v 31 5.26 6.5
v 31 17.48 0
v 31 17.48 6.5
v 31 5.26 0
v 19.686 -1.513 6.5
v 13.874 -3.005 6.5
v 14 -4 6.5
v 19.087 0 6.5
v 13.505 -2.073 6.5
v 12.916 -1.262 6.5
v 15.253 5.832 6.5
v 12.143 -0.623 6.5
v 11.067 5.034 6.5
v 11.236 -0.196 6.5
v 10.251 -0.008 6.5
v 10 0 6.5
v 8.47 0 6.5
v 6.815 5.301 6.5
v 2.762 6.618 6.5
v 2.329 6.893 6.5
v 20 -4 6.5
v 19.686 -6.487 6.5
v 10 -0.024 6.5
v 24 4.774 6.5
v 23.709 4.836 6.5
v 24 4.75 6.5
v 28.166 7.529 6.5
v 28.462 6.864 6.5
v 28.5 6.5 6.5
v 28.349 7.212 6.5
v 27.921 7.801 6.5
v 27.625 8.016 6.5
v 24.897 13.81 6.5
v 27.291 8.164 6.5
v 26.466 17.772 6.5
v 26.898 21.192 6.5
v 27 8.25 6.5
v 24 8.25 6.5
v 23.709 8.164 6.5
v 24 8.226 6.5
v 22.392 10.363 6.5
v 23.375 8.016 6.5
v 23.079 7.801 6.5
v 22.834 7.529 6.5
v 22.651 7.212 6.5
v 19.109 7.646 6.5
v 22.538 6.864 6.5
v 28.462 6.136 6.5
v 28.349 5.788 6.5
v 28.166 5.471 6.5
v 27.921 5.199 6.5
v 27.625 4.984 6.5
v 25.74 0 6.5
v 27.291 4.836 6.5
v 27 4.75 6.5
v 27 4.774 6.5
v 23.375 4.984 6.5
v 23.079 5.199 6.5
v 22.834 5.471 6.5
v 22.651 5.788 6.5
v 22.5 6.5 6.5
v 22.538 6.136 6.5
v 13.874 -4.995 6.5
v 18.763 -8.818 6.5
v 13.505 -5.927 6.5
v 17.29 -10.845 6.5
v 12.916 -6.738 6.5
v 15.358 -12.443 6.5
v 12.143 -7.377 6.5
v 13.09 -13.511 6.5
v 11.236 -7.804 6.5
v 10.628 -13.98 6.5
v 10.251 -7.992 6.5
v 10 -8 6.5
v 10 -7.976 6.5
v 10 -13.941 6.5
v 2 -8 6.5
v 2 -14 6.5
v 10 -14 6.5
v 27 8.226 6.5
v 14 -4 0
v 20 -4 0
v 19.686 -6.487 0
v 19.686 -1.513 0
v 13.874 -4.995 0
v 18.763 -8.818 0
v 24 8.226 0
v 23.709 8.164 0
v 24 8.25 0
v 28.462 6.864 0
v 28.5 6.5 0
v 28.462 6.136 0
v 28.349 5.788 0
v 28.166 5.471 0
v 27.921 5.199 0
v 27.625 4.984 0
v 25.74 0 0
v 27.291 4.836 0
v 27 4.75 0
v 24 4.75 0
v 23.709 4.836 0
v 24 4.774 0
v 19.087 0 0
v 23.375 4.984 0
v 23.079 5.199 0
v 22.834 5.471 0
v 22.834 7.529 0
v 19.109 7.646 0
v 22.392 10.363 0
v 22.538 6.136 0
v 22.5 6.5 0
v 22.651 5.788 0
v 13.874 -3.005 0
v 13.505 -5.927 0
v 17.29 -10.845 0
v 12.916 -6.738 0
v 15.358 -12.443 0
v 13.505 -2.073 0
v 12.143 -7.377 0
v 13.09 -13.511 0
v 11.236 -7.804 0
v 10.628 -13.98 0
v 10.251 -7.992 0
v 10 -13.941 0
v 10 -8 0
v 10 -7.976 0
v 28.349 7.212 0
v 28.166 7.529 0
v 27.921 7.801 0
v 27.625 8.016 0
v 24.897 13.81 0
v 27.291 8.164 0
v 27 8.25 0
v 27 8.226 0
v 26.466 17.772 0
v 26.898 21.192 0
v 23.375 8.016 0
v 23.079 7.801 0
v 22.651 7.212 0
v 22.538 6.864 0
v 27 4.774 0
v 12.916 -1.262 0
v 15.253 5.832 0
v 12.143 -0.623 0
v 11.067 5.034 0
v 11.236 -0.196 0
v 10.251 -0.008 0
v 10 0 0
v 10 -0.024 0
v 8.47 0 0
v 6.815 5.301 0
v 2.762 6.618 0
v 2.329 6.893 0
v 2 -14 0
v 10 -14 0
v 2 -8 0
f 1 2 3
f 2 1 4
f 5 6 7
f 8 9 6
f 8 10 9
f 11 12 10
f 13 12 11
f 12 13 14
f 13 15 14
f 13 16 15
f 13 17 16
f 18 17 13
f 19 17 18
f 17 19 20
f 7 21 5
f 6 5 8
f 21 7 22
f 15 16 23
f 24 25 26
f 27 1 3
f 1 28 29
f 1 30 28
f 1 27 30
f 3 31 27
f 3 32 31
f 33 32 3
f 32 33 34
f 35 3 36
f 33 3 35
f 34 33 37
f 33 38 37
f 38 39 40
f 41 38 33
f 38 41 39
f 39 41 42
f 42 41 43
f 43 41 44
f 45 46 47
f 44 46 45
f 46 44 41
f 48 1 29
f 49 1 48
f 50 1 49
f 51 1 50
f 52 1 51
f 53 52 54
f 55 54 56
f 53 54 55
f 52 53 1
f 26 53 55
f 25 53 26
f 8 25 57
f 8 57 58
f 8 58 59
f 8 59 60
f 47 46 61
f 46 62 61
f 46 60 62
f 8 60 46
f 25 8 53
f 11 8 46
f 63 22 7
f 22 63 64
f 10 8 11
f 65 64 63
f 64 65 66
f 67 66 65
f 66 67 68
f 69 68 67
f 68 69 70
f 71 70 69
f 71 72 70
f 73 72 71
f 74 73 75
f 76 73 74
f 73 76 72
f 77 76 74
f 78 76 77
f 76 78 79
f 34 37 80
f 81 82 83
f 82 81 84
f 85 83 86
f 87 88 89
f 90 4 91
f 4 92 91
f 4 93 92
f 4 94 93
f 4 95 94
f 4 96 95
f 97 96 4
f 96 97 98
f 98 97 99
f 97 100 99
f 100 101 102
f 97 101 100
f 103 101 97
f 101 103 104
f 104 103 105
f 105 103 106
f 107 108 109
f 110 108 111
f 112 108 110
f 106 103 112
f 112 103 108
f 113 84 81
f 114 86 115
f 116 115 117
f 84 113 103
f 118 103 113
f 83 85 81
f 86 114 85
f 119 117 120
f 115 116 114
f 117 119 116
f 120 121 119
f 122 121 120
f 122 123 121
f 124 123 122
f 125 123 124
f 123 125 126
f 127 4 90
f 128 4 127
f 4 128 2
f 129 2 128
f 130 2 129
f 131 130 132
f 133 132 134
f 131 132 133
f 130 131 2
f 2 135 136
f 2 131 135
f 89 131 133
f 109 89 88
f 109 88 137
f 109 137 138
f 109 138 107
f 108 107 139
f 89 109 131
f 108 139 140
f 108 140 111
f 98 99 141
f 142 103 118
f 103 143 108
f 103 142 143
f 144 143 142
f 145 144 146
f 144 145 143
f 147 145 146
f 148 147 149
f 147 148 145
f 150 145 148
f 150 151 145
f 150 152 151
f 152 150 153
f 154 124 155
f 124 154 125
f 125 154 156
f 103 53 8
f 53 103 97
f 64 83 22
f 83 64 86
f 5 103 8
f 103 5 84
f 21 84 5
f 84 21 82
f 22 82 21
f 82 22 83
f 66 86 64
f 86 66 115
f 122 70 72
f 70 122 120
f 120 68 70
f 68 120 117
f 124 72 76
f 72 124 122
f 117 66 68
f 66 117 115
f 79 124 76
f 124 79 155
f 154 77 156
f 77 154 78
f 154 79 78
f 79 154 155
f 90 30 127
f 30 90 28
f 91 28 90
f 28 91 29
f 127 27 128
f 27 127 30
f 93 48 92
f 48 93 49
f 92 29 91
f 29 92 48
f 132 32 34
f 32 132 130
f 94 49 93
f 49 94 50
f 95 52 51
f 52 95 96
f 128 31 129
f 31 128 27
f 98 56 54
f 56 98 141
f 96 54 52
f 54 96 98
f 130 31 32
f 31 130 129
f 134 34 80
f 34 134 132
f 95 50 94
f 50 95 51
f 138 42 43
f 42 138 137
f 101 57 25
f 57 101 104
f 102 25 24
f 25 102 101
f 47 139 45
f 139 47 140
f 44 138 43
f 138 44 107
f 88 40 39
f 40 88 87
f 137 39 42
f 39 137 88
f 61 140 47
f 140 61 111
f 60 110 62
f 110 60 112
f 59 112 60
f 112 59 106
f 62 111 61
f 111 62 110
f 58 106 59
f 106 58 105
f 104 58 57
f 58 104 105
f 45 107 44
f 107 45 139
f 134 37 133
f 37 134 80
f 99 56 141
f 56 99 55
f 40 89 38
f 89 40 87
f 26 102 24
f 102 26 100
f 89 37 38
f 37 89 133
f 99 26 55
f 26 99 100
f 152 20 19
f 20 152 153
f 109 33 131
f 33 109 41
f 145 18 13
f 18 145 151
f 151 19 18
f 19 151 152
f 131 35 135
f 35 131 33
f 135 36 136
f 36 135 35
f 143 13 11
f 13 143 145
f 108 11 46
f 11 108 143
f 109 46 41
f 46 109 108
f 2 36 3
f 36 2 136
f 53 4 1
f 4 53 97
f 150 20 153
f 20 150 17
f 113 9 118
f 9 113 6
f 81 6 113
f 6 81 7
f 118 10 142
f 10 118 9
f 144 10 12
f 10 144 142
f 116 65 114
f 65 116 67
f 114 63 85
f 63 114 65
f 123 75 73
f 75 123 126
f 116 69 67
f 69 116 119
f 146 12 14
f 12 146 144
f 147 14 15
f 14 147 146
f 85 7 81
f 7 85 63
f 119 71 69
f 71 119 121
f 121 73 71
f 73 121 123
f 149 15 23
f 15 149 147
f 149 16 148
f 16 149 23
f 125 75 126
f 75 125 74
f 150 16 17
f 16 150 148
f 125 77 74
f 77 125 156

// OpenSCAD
// file: library/library_3d.scad
// ========================================================================================
// Robori Mendel
// General 3D library
// GNU GPL v3
//
// Contact : support@robori.com
// Reference : http://www.robori.com/documentation/Mendel
//
// History :
// 2013 - First version
// ========================================================================================

lib3d_fn = 50;

// TESTING
//lib3d_hex_nut_recess(3);
//lib3d_round_cube(10, 8, 10, 1, true, false, true, false);


// Hexagonal nut recess
module lib3d_hex_nut_recess(size)
{
	length = 0.8*size;
	hex_r = 1.8*size/2;
	cylinder(h=length, r=hex_r, center=false, $fn=6);
}

// Cube with customized rounded corners
module lib3d_round_cube(x, y, z, rad, left_top=true, left_bottom=true, right_top=true, right_bottom=true)
{
	rx = x/2 - rad + 0.02;
	ry = y/2 - rad + 0.02;

	translate([x/2, y/2, 0]) difference()
	{	
		translate([-x/2, -y/2, 0]) cube([x, y, z]);
		if (left_top)
			translate([-rx, ry, -1]) rotate([0, 0, 90]) __lib3d_round_corner(rad, z + 2);
		if (left_bottom)
			translate([-rx, -ry, -1]) rotate([0, 0, 180]) __lib3d_round_corner(rad, z + 2);
		if (right_top)
			translate([rx, ry, -1]) __lib3d_round_corner(rad, z + 2);
		if (right_bottom)
			translate([rx, -ry, -1]) rotate([0, 0, 270]) __lib3d_round_corner(rad, z + 2);
	}
}

// Helper
module __lib3d_round_corner(rad, height)
{
	difference()
	{
		cube([rad, rad, height]);
		cylinder(h=height, r=rad, center=false, $fn=lib3d_fn);
	}
}
// file: extruder-block.scad
// ========================================================================================
// Robori Mendel
// Extruder block
// GNU GPL v3
//
// Contact : support@robori.com
// Reference : http://www.robori.com/documentation/Mendel
//
// History :
// 1 May 2015 - Increase plate thickness
// ========================================================================================

include <library/library_3d.scad>;

$fn = 30;
lib3d_fn = 30;

// Add plate thickness
add_t = 0.5;
union()
{
	extruder_block();
	translate([0, 0, -add_t + 0.01]) linear_extrude(height=add_t, convexity=10) import(file="extruder-block-projection.dxf", layer="0");
}

// Create 2D projection to be exported into DXF
//projection(cut=true) translate([0, 0, -0.1]) extruder_block();


module extruder_block()
{
	rotate([180, 0, 180]) union()
	{
		base();
		translate([22.5, 51, 0]) clamp();
		translate([44.74 + 1.5, 28, 0]) idler_mount();
		translate([44.74 + 1.5, -3, 0]) idler_adjuster();
	}
}

module idler_adjuster()
{
	nut_size = 3 + 0.8;
	nut_h = 0.8*nut_size;
	recess_h = 7;
	count = floor(recess_h/nut_h);

	difference()
	{
		// block
		translate([0, 0, -24.25]) lib3d_round_cube(21.12, 14 + 3, 24.25, 3, false, false, false, true);
		// bearing housing
		translate([9.87, 21 + 3, -24.25 - 1]) cylinder(h=24.25 + 2, r=9 + 0.3, center=false);
		// angle cut
		translate([17.4, 14 + 3, -24.25 - 1]) rotate([0, 0, -25]) cube([5, 5, 24.25 + 2]);
		// screw hole
		translate([9.87, 2.75 + 3, -24.25 - 1 - 0.5]) cylinder(h=20.5 + 1 + add_t, r=1.5 + 0.4, center=false);
		translate([9.87, 2.75 + 3, -3.75 + add_t]) cylinder(h=3.75 + 1 - add_t, r=2.25 + 0.75, center=false);
		// idler screw holes
		translate([-1, 8.5 + 3, -4.75]) rotate([0, 90, 0]) cylinder(h=21.12 + 2, r=2, center=false);
		translate([-1, 8.5 + 3, -19.75]) rotate([0, 90, 0]) cylinder(h=21.12 + 2, r=2, center=false);
		// idler nut recesses
		for (i = [0 : 1 : count - 1])
		{
			translate([i*nut_h - (i + 1)*0.02, 8.5 + 3, -4.75]) rotate([90, 0, 90]) lib3d_hex_nut_recess(nut_size);
			translate([i*nut_h - (i + 1)*0.02, 8.5 + 3, -19.75]) rotate([90, 0, 90]) lib3d_hex_nut_recess(nut_size);
		}
		translate([recess_h - nut_h, 8.5 + 3, -4.75]) rotate([90, 0, 90]) lib3d_hex_nut_recess(nut_size);
		translate([recess_h - nut_h, 8.5 + 3, -19.75]) rotate([90, 0, 90]) lib3d_hex_nut_recess(nut_size);
		// filament hole
		translate([16.25, -1, -12.25]) rotate([-90, 0, 0]) cylinder(h=14 + 3 + 2, r=1.25, center=false);
		// cut length
		translate([-1, -1, -24.25 -1]) cube([3.5 + 1, 14 + 3 + 2, 24.25 + 2]);
	}
}

module idler_mount()
{
	difference()
	{
		union()
		{
			// block
			translate([0, 0, -24.25]) cube([21.12, 14 + 3, 24.25]);
			// mount
			translate([17.4, 0, -24.25]) lib3d_round_cube(21.58, 17, 24.25, 5, false, false, true, false);
		}
		// bearing housing
		translate([9.87, -7, -24.25 - 1]) cylinder(h=24.25 + 2, r=9 + 0.3, center=false);
		// mount
		// 2015-05-13 : adjust idler position 0.5mm to center MK7 drive gear
		translate([21.12, 0, -7.75 - 0.5 - 0.5]) lib3d_round_cube(13, 13, 7.75 + 0.5 + 1, 2, true, false, true, false);
		translate([21.12, 0, -24.25 - 1 + 0.5]) lib3d_round_cube(13, 13, 7.5 - 0.5 + 1, 2, true, false, true, false);
		// mount hole
		translate([26.62, 7.5, -9 - 7.75 - 0.5 - 0.5]) cylinder(h=9, r=1.5 + 0.4, center=false);
		// angle cut
		translate([17.4, 0, -24.25 - 1]) rotate([0, 0, -65]) cube([10, 25, 24.25 + 2]);
		// screw hole
		translate([9.87, 11.25, -24.25 - 1 - 0.5]) cylinder(h=20.5 + 1 + add_t, r=1.5 + 0.4, center=false);
		translate([9.87, 11.25, -3.75 + add_t]) cylinder(h=3.75 + 1 - add_t, r=2.25 + 0.75, center=false);
		// bowden start slot
		translate([16.25, 17, -13.25]) rotate([90, 0, 0]) cylinder(h=13 + 1, r=3.5, center=false);
		translate([16.25, -1, -12.25]) rotate([-90, 0, 0]) cylinder(h=4 + 2, r1=2.25, r2=0.75, center=false);
		// tongue slot
		translate([12.25 - 0.1, 5.2 - 0.3, -24.25 - 1]) cube([8 + 0.2, 4 + 0.6, 15.8 + 1]);
	}
}

module clamp()
{
	translate([0, 0, -30]) difference()
	{
		// block
		union()
		{
			cylinder(h=30, r=8, center=false);
			translate([-8, 0, 0]) cube([16, 16, 30]);
		}
		// threaded rod slot
		translate([0, 0, -1]) cylinder(h=30 + 2, r=4 + 0.25, center=false);
		translate([-4, 0, -1]) cube([8 + 0.5, 16 + 1, 30 + 2]);
		// screw holes
		translate([0, 11.5, 5.5]) rotate([0, 90, 0]) cylinder(h=18 + 2, r=1.5 + 0.5, center=true);
		translate([0, 11.5, 24.5]) rotate([0, 90, 0]) cylinder(h=18 + 2, r=1.5 + 0.5, center=true);
	}
}

module base()
{
	difference()
	{
		union()
		{
			// plate
			translate([0, 0, -6]) cube([44.74 + 1.5, 42, 6]);
			// clamp base
			translate([0, 42 - 0.1, -6]) cube([41, 9.5 + 0.1, 6]);
			// bearing housing
			translate([44.74 + 1.5 - 1, 11.76, -6]) cube([21.12 + 1, 18.47, 6]);
			translate([54.61 + 1.5, 21, -8]) cylinder(h=8, r=9 + 0.35, center=false);
		}
		// clamp base
		translate([41, 42, -6 - 1]) rotate([0, 0, 45]) cube([15, 15, 6 + 2]);
		translate([13.5, 51.5, -6 - 1]) rotate([0, 0, 135]) cube([15, 20, 6 + 2]);
		translate([18.5, 47, -6 - 1]) cube([8 + 2, 8, 6 + 2]);
		// corner
		translate([4, 0, -6 - 1]) rotate([0, 0, 135]) cube([6, 6, 6 + 2]);
		// circle
		translate([22.5, 21, -6 - 1]) cylinder(h=6 + 2, r=16, center=false);
		// mount holes
		translate([7, 36.5, -6 - 1]) motor_mount_hole();
		translate([7, 5.5, -6 - 1]) motor_mount_hole();
		translate([38, 36.5, -6 - 1]) motor_mount_hole();
		// retainer slot
		translate([20.08, 0, -6 - 1]) rotate([0, 0, 41.7]) cube([10, 12, 6 + 2]);
		translate([44.74 + 1.5, 14, -6 - 1]) rotate([0, 0, 137.86]) cube([12, 12, 6 + 2]);
		translate([20.08, -1, -6 - 1]) cube([24.65 + 1.5 + 3.5 + 0.03, 14 + 1, 6 + 2]);
		// bearing housing
		translate([54.61 + 1.5, 21, -8 - 1]) cylinder(h=8 + 2, r=5.5, center=false);
		translate([54.61 + 1.5, 21, -8 - 3]) cylinder(h=8, r=7 + 0.15, center=false);
	}
}

module motor_mount_hole()
{
	union()
	{
		translate([1.5 - 0.25, 0, 0]) cylinder(h=6 + 2, r=1.5 + 0.25, center=false);
		translate([-1.5 + 0.25, 0, 0]) cylinder(h=6 + 2, r=1.5 + 0.25, center=false);
		translate([-1.5, -1.5 - 0.25, 0]) cube([3, 3 + 0.5, 6 + 2]);
	}
}
// main file
// ========================================================================================
// Robori Mendel
// Extruder retainer
// GNU GPL v3
//
// Contact : support@robori.com
// Reference : http://www.robori.com/documentation/Mendel
//
// History :
// 1 May 2015 - Increase thickness
// 2014 - First version
// ========================================================================================

use <extruder-block.scad>;

$fn = 25;

extruder_retainer();


module extruder_retainer()
{
	add_t = 0.5;
	
	difference()
	{
		union()
		{
			// base
			cube([31, 22, 6 + add_t]);
			translate([10, -4, 0]) cylinder(h=6 + add_t, r=10, center=false);
			translate([2, -14, 0]) cube([8, 6, 6 + add_t]);
		}
		// circle
		translate([10, 22, -1]) cylinder(h=6 + 2, r=16 + 1, center=false);
		// corners
		translate([31, 17.48, -1]) rotate([0, 0, 47.86]) cube([8, 8, 6 + 2]);
		translate([25.74, 0, -1]) rotate([0, 0, -45]) cube([8, 8, 6 + 2]);
		translate([8.47, 0, -1]) rotate([0, 0, 131.7]) cube([13, 13, 6 + 2]);
		// motor mount hole
		translate([25.5, 6.5, -1]) motor_mount_hole();
		// retainer
		translate([10, -4, -1]) cylinder(h=6 + 2, r=4, center=false);
		translate([0, -8, -1]) cube([10, 8, 6 + 2]);
		translate([0, -14, -1]) cube([2, 14, 6 + 2]);
	}
}
